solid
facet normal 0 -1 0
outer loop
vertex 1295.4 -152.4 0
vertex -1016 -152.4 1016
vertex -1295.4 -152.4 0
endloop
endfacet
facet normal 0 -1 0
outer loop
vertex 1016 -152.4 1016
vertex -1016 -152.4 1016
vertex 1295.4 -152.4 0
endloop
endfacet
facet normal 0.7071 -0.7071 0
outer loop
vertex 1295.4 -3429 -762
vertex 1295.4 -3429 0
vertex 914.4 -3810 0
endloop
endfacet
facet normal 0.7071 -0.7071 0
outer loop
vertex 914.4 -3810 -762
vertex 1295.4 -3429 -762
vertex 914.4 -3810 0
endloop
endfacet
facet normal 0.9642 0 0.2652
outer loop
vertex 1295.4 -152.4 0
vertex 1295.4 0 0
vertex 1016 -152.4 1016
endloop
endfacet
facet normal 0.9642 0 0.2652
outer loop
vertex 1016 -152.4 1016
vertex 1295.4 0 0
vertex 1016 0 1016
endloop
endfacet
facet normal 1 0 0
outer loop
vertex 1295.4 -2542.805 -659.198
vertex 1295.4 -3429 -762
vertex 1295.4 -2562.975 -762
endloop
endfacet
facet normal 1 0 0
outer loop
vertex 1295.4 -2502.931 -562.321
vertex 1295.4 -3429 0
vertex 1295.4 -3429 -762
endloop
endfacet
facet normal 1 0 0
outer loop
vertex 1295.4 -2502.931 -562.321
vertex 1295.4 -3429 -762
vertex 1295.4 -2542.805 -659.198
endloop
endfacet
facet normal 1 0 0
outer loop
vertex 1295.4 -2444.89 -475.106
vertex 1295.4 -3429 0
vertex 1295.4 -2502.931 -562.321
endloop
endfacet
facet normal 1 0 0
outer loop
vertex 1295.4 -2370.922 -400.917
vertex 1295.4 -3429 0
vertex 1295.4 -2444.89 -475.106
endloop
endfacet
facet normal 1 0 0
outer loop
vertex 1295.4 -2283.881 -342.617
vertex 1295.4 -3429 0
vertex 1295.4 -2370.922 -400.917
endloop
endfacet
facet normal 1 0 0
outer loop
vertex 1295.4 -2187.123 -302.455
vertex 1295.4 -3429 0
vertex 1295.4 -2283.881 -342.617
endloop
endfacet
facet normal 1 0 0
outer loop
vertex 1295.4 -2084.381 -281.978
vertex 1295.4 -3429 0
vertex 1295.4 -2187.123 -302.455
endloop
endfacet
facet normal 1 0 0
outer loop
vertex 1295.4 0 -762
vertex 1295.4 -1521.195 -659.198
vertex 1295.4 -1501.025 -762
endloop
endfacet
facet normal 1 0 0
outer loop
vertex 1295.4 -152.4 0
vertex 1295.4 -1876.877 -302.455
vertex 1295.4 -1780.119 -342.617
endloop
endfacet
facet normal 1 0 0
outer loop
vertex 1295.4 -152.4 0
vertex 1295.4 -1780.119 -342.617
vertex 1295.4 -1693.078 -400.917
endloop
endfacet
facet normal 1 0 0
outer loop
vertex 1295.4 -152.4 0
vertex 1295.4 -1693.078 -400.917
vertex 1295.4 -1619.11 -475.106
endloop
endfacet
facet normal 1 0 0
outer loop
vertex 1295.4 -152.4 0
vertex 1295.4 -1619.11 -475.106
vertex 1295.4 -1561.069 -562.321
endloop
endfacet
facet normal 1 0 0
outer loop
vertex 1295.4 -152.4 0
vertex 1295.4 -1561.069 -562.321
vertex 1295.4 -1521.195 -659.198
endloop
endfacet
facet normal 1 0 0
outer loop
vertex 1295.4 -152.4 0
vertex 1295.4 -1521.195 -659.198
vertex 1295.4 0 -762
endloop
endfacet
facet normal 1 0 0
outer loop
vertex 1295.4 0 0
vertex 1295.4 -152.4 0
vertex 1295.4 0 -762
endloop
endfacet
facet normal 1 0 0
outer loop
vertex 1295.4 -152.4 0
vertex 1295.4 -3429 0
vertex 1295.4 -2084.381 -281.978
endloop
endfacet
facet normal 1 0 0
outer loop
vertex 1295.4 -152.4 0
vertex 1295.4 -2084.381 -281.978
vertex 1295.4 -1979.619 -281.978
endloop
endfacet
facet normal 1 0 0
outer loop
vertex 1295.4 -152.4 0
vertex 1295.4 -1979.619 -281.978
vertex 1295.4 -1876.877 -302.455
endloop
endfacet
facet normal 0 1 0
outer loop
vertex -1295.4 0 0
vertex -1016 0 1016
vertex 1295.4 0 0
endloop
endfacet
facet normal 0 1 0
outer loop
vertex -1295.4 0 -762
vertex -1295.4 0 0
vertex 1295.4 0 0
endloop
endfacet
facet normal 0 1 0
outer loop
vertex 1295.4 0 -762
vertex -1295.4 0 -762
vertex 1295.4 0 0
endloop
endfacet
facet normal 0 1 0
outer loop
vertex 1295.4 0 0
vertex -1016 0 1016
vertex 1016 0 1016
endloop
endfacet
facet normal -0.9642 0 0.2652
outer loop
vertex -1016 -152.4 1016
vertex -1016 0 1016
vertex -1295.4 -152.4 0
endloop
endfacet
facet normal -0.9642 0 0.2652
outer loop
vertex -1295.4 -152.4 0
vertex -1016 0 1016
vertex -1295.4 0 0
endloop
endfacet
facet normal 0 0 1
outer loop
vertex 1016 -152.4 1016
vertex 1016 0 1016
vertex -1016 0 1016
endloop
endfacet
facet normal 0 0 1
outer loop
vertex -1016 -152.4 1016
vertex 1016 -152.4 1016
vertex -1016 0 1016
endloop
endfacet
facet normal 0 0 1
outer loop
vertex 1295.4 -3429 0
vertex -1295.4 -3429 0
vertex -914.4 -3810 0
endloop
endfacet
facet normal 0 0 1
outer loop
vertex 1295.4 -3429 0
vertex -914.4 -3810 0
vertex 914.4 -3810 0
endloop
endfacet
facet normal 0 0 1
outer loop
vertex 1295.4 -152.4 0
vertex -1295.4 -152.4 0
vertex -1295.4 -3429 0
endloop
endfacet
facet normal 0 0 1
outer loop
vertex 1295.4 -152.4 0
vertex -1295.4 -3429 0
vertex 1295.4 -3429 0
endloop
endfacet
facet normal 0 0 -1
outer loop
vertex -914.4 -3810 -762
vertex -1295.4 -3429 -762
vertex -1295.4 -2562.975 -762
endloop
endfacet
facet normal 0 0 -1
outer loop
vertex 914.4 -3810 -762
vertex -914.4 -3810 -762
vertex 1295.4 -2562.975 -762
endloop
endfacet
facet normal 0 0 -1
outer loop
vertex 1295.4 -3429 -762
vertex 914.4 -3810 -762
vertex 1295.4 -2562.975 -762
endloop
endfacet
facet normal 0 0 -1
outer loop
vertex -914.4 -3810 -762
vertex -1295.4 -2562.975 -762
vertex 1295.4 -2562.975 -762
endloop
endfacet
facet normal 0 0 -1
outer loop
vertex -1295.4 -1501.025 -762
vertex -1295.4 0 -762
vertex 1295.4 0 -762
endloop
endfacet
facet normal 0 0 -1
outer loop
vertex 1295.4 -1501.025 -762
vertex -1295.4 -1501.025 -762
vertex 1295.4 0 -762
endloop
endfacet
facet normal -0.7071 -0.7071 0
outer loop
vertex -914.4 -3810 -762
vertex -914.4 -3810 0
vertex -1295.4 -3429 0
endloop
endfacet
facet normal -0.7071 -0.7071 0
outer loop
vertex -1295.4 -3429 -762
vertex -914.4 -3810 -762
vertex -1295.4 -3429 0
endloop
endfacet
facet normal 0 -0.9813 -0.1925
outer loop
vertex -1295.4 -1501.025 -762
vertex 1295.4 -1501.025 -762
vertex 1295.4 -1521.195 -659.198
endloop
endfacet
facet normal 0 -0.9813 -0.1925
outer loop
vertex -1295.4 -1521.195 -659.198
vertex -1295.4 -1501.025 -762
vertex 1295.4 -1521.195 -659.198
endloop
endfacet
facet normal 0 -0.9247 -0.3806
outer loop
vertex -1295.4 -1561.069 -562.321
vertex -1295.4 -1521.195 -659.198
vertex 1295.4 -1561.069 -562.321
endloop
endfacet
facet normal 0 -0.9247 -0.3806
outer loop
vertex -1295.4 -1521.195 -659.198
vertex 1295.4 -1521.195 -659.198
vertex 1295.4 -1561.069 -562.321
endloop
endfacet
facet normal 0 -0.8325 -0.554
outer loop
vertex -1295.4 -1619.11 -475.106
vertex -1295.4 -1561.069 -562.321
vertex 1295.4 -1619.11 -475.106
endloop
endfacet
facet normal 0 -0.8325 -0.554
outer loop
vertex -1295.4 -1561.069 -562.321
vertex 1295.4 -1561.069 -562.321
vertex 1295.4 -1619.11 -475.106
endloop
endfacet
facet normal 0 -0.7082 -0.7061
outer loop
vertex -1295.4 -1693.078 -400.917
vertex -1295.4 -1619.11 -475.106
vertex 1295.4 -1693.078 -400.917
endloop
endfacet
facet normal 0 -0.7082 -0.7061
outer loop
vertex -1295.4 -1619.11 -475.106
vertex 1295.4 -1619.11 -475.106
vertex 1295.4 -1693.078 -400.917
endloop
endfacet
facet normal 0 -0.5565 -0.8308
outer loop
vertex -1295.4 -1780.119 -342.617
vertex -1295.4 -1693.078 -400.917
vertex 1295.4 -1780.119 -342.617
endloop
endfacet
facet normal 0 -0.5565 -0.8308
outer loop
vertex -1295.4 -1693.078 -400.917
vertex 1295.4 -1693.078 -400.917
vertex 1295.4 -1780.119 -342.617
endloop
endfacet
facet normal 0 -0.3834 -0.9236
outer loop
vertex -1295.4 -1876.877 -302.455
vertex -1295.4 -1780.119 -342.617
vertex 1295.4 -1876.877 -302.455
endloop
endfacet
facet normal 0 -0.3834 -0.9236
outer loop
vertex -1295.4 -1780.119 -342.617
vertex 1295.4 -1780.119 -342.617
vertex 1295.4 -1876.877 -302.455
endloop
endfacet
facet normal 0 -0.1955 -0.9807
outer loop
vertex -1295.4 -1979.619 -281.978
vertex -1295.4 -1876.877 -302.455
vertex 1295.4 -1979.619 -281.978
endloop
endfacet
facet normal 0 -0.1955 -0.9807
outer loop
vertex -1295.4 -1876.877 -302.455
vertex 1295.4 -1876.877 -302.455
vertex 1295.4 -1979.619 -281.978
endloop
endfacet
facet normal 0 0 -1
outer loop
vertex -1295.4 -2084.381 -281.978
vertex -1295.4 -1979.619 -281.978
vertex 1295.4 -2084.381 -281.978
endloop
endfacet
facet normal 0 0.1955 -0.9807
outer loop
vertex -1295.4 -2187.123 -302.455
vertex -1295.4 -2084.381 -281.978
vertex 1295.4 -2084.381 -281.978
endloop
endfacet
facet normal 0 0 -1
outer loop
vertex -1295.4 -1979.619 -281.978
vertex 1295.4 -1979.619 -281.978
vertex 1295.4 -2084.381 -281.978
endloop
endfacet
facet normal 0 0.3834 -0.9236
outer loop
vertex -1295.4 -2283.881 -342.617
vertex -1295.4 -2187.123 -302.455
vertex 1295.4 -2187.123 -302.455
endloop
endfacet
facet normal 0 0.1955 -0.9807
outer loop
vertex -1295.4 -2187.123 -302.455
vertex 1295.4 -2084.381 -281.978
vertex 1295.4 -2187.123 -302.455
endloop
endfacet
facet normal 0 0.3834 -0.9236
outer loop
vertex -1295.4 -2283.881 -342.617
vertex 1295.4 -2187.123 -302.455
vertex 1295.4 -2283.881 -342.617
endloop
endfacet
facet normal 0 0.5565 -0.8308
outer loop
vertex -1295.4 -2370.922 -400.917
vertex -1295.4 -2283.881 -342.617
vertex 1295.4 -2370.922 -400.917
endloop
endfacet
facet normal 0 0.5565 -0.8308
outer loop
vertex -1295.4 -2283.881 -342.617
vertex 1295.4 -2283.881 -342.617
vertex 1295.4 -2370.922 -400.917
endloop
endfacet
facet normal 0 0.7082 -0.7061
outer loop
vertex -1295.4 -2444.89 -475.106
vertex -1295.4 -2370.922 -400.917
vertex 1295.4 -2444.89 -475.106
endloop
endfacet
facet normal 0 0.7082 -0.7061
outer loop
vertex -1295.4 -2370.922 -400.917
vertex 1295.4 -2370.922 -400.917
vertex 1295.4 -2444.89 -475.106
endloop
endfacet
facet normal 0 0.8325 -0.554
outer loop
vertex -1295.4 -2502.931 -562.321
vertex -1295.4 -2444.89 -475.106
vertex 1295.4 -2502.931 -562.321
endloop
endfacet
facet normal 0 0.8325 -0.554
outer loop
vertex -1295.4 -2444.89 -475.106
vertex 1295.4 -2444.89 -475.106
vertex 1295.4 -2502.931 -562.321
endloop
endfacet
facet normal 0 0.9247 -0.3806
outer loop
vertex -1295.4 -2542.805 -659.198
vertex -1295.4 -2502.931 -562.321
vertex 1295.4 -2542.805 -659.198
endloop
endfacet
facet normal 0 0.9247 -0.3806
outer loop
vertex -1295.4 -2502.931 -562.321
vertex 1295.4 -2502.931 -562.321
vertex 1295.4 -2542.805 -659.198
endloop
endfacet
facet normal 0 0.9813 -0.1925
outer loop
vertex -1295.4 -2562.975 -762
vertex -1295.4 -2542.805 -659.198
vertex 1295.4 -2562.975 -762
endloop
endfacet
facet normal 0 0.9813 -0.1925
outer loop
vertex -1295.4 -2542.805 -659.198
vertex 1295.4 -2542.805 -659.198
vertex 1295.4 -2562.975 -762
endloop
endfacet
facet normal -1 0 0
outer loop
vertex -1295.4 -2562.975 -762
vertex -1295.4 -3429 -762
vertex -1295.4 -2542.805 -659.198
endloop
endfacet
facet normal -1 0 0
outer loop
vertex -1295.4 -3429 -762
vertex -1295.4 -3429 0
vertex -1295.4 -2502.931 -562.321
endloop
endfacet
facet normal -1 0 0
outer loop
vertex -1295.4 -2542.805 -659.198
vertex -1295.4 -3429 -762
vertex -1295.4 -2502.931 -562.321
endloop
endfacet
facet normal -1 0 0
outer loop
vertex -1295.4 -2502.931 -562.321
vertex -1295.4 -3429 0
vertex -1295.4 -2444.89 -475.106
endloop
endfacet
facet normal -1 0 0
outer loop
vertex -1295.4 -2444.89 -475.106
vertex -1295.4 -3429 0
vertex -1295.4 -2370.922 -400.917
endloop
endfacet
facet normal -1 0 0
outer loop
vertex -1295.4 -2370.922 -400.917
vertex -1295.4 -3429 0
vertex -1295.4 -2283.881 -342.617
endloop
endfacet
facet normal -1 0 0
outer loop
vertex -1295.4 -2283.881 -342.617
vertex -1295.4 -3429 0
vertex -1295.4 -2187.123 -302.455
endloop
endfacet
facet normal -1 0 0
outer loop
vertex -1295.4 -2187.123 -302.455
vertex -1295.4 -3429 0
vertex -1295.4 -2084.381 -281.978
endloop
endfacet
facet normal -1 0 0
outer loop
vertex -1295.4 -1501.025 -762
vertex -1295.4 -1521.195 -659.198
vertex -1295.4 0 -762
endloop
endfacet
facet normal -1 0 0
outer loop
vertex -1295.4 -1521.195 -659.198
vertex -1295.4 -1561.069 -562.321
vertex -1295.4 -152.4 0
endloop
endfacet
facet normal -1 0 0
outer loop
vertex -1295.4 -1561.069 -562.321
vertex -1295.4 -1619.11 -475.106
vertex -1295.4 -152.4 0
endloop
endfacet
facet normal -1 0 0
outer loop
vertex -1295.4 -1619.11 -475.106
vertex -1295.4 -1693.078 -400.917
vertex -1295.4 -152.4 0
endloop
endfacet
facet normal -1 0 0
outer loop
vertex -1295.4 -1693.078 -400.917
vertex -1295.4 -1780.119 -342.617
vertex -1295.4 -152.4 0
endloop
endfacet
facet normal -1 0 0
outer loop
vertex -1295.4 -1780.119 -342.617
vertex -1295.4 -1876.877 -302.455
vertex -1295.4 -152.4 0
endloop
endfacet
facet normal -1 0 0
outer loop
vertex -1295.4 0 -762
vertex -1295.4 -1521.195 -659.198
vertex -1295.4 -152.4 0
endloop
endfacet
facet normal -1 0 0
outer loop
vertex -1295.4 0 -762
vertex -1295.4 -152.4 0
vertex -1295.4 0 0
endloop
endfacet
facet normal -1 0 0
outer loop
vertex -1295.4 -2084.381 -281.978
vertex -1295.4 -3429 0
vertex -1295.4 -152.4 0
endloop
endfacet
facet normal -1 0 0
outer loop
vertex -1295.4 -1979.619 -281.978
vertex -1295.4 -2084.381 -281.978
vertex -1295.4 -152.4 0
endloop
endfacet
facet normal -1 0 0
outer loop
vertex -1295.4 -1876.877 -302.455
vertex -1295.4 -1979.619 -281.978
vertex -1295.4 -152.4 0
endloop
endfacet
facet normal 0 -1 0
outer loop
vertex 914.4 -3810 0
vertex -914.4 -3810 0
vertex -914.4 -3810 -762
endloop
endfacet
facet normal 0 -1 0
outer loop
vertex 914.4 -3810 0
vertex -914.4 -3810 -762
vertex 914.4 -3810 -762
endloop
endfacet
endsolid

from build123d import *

# Parameters (mm, degrees)
F3_W          = 2590.8
F3_H          = 3810
F4_DEPTH      = 762
F5_R          = 533.4
F6_DEPTH      = 1295.401
F6_DEPTH_BACK = 1295.401
F8_DEPTH      = 762.001
F10_DEPTH     = 152.4


with BuildPart() as f4:
    # F3 (on Top) → F4 (new body)
    with BuildSketch(Plane.XY):
        with Locations((0, -1905)):
            Rectangle(F3_W, F3_H)
    extrude(amount=-F4_DEPTH)

    # F5 (on Right) → F6 (cut, two sides)
    with BuildSketch(Plane.YZ) as f6_sk:
        with Locations((-2032, -812.8)):
            Circle(F5_R)
    extrude(amount=-F6_DEPTH, mode=Mode.SUBTRACT)
    extrude(f6_sk.sketch, amount=F6_DEPTH_BACK, mode=Mode.SUBTRACT)

    # F7 (on Top) → F8 (cut, through all)
    with BuildSketch(Plane.XY):
        Polygon((1295.4, -3810), (1295.4, -3429), (914.4, -3810), align=None)
        Polygon((-1295.4, -3810), (-914.4, -3810), (-1295.4, -3429), align=None)
    extrude(amount=-F8_DEPTH, mode=Mode.SUBTRACT)

    # F9 (on Front) → F10 (join)
    with BuildSketch(Plane.XZ):
        Polygon((-1016, 1016), (-1295.4, 0), (1295.4, 0), (1016, 1016), align=None)
    extrude(amount=F10_DEPTH)


solid = f4.part
